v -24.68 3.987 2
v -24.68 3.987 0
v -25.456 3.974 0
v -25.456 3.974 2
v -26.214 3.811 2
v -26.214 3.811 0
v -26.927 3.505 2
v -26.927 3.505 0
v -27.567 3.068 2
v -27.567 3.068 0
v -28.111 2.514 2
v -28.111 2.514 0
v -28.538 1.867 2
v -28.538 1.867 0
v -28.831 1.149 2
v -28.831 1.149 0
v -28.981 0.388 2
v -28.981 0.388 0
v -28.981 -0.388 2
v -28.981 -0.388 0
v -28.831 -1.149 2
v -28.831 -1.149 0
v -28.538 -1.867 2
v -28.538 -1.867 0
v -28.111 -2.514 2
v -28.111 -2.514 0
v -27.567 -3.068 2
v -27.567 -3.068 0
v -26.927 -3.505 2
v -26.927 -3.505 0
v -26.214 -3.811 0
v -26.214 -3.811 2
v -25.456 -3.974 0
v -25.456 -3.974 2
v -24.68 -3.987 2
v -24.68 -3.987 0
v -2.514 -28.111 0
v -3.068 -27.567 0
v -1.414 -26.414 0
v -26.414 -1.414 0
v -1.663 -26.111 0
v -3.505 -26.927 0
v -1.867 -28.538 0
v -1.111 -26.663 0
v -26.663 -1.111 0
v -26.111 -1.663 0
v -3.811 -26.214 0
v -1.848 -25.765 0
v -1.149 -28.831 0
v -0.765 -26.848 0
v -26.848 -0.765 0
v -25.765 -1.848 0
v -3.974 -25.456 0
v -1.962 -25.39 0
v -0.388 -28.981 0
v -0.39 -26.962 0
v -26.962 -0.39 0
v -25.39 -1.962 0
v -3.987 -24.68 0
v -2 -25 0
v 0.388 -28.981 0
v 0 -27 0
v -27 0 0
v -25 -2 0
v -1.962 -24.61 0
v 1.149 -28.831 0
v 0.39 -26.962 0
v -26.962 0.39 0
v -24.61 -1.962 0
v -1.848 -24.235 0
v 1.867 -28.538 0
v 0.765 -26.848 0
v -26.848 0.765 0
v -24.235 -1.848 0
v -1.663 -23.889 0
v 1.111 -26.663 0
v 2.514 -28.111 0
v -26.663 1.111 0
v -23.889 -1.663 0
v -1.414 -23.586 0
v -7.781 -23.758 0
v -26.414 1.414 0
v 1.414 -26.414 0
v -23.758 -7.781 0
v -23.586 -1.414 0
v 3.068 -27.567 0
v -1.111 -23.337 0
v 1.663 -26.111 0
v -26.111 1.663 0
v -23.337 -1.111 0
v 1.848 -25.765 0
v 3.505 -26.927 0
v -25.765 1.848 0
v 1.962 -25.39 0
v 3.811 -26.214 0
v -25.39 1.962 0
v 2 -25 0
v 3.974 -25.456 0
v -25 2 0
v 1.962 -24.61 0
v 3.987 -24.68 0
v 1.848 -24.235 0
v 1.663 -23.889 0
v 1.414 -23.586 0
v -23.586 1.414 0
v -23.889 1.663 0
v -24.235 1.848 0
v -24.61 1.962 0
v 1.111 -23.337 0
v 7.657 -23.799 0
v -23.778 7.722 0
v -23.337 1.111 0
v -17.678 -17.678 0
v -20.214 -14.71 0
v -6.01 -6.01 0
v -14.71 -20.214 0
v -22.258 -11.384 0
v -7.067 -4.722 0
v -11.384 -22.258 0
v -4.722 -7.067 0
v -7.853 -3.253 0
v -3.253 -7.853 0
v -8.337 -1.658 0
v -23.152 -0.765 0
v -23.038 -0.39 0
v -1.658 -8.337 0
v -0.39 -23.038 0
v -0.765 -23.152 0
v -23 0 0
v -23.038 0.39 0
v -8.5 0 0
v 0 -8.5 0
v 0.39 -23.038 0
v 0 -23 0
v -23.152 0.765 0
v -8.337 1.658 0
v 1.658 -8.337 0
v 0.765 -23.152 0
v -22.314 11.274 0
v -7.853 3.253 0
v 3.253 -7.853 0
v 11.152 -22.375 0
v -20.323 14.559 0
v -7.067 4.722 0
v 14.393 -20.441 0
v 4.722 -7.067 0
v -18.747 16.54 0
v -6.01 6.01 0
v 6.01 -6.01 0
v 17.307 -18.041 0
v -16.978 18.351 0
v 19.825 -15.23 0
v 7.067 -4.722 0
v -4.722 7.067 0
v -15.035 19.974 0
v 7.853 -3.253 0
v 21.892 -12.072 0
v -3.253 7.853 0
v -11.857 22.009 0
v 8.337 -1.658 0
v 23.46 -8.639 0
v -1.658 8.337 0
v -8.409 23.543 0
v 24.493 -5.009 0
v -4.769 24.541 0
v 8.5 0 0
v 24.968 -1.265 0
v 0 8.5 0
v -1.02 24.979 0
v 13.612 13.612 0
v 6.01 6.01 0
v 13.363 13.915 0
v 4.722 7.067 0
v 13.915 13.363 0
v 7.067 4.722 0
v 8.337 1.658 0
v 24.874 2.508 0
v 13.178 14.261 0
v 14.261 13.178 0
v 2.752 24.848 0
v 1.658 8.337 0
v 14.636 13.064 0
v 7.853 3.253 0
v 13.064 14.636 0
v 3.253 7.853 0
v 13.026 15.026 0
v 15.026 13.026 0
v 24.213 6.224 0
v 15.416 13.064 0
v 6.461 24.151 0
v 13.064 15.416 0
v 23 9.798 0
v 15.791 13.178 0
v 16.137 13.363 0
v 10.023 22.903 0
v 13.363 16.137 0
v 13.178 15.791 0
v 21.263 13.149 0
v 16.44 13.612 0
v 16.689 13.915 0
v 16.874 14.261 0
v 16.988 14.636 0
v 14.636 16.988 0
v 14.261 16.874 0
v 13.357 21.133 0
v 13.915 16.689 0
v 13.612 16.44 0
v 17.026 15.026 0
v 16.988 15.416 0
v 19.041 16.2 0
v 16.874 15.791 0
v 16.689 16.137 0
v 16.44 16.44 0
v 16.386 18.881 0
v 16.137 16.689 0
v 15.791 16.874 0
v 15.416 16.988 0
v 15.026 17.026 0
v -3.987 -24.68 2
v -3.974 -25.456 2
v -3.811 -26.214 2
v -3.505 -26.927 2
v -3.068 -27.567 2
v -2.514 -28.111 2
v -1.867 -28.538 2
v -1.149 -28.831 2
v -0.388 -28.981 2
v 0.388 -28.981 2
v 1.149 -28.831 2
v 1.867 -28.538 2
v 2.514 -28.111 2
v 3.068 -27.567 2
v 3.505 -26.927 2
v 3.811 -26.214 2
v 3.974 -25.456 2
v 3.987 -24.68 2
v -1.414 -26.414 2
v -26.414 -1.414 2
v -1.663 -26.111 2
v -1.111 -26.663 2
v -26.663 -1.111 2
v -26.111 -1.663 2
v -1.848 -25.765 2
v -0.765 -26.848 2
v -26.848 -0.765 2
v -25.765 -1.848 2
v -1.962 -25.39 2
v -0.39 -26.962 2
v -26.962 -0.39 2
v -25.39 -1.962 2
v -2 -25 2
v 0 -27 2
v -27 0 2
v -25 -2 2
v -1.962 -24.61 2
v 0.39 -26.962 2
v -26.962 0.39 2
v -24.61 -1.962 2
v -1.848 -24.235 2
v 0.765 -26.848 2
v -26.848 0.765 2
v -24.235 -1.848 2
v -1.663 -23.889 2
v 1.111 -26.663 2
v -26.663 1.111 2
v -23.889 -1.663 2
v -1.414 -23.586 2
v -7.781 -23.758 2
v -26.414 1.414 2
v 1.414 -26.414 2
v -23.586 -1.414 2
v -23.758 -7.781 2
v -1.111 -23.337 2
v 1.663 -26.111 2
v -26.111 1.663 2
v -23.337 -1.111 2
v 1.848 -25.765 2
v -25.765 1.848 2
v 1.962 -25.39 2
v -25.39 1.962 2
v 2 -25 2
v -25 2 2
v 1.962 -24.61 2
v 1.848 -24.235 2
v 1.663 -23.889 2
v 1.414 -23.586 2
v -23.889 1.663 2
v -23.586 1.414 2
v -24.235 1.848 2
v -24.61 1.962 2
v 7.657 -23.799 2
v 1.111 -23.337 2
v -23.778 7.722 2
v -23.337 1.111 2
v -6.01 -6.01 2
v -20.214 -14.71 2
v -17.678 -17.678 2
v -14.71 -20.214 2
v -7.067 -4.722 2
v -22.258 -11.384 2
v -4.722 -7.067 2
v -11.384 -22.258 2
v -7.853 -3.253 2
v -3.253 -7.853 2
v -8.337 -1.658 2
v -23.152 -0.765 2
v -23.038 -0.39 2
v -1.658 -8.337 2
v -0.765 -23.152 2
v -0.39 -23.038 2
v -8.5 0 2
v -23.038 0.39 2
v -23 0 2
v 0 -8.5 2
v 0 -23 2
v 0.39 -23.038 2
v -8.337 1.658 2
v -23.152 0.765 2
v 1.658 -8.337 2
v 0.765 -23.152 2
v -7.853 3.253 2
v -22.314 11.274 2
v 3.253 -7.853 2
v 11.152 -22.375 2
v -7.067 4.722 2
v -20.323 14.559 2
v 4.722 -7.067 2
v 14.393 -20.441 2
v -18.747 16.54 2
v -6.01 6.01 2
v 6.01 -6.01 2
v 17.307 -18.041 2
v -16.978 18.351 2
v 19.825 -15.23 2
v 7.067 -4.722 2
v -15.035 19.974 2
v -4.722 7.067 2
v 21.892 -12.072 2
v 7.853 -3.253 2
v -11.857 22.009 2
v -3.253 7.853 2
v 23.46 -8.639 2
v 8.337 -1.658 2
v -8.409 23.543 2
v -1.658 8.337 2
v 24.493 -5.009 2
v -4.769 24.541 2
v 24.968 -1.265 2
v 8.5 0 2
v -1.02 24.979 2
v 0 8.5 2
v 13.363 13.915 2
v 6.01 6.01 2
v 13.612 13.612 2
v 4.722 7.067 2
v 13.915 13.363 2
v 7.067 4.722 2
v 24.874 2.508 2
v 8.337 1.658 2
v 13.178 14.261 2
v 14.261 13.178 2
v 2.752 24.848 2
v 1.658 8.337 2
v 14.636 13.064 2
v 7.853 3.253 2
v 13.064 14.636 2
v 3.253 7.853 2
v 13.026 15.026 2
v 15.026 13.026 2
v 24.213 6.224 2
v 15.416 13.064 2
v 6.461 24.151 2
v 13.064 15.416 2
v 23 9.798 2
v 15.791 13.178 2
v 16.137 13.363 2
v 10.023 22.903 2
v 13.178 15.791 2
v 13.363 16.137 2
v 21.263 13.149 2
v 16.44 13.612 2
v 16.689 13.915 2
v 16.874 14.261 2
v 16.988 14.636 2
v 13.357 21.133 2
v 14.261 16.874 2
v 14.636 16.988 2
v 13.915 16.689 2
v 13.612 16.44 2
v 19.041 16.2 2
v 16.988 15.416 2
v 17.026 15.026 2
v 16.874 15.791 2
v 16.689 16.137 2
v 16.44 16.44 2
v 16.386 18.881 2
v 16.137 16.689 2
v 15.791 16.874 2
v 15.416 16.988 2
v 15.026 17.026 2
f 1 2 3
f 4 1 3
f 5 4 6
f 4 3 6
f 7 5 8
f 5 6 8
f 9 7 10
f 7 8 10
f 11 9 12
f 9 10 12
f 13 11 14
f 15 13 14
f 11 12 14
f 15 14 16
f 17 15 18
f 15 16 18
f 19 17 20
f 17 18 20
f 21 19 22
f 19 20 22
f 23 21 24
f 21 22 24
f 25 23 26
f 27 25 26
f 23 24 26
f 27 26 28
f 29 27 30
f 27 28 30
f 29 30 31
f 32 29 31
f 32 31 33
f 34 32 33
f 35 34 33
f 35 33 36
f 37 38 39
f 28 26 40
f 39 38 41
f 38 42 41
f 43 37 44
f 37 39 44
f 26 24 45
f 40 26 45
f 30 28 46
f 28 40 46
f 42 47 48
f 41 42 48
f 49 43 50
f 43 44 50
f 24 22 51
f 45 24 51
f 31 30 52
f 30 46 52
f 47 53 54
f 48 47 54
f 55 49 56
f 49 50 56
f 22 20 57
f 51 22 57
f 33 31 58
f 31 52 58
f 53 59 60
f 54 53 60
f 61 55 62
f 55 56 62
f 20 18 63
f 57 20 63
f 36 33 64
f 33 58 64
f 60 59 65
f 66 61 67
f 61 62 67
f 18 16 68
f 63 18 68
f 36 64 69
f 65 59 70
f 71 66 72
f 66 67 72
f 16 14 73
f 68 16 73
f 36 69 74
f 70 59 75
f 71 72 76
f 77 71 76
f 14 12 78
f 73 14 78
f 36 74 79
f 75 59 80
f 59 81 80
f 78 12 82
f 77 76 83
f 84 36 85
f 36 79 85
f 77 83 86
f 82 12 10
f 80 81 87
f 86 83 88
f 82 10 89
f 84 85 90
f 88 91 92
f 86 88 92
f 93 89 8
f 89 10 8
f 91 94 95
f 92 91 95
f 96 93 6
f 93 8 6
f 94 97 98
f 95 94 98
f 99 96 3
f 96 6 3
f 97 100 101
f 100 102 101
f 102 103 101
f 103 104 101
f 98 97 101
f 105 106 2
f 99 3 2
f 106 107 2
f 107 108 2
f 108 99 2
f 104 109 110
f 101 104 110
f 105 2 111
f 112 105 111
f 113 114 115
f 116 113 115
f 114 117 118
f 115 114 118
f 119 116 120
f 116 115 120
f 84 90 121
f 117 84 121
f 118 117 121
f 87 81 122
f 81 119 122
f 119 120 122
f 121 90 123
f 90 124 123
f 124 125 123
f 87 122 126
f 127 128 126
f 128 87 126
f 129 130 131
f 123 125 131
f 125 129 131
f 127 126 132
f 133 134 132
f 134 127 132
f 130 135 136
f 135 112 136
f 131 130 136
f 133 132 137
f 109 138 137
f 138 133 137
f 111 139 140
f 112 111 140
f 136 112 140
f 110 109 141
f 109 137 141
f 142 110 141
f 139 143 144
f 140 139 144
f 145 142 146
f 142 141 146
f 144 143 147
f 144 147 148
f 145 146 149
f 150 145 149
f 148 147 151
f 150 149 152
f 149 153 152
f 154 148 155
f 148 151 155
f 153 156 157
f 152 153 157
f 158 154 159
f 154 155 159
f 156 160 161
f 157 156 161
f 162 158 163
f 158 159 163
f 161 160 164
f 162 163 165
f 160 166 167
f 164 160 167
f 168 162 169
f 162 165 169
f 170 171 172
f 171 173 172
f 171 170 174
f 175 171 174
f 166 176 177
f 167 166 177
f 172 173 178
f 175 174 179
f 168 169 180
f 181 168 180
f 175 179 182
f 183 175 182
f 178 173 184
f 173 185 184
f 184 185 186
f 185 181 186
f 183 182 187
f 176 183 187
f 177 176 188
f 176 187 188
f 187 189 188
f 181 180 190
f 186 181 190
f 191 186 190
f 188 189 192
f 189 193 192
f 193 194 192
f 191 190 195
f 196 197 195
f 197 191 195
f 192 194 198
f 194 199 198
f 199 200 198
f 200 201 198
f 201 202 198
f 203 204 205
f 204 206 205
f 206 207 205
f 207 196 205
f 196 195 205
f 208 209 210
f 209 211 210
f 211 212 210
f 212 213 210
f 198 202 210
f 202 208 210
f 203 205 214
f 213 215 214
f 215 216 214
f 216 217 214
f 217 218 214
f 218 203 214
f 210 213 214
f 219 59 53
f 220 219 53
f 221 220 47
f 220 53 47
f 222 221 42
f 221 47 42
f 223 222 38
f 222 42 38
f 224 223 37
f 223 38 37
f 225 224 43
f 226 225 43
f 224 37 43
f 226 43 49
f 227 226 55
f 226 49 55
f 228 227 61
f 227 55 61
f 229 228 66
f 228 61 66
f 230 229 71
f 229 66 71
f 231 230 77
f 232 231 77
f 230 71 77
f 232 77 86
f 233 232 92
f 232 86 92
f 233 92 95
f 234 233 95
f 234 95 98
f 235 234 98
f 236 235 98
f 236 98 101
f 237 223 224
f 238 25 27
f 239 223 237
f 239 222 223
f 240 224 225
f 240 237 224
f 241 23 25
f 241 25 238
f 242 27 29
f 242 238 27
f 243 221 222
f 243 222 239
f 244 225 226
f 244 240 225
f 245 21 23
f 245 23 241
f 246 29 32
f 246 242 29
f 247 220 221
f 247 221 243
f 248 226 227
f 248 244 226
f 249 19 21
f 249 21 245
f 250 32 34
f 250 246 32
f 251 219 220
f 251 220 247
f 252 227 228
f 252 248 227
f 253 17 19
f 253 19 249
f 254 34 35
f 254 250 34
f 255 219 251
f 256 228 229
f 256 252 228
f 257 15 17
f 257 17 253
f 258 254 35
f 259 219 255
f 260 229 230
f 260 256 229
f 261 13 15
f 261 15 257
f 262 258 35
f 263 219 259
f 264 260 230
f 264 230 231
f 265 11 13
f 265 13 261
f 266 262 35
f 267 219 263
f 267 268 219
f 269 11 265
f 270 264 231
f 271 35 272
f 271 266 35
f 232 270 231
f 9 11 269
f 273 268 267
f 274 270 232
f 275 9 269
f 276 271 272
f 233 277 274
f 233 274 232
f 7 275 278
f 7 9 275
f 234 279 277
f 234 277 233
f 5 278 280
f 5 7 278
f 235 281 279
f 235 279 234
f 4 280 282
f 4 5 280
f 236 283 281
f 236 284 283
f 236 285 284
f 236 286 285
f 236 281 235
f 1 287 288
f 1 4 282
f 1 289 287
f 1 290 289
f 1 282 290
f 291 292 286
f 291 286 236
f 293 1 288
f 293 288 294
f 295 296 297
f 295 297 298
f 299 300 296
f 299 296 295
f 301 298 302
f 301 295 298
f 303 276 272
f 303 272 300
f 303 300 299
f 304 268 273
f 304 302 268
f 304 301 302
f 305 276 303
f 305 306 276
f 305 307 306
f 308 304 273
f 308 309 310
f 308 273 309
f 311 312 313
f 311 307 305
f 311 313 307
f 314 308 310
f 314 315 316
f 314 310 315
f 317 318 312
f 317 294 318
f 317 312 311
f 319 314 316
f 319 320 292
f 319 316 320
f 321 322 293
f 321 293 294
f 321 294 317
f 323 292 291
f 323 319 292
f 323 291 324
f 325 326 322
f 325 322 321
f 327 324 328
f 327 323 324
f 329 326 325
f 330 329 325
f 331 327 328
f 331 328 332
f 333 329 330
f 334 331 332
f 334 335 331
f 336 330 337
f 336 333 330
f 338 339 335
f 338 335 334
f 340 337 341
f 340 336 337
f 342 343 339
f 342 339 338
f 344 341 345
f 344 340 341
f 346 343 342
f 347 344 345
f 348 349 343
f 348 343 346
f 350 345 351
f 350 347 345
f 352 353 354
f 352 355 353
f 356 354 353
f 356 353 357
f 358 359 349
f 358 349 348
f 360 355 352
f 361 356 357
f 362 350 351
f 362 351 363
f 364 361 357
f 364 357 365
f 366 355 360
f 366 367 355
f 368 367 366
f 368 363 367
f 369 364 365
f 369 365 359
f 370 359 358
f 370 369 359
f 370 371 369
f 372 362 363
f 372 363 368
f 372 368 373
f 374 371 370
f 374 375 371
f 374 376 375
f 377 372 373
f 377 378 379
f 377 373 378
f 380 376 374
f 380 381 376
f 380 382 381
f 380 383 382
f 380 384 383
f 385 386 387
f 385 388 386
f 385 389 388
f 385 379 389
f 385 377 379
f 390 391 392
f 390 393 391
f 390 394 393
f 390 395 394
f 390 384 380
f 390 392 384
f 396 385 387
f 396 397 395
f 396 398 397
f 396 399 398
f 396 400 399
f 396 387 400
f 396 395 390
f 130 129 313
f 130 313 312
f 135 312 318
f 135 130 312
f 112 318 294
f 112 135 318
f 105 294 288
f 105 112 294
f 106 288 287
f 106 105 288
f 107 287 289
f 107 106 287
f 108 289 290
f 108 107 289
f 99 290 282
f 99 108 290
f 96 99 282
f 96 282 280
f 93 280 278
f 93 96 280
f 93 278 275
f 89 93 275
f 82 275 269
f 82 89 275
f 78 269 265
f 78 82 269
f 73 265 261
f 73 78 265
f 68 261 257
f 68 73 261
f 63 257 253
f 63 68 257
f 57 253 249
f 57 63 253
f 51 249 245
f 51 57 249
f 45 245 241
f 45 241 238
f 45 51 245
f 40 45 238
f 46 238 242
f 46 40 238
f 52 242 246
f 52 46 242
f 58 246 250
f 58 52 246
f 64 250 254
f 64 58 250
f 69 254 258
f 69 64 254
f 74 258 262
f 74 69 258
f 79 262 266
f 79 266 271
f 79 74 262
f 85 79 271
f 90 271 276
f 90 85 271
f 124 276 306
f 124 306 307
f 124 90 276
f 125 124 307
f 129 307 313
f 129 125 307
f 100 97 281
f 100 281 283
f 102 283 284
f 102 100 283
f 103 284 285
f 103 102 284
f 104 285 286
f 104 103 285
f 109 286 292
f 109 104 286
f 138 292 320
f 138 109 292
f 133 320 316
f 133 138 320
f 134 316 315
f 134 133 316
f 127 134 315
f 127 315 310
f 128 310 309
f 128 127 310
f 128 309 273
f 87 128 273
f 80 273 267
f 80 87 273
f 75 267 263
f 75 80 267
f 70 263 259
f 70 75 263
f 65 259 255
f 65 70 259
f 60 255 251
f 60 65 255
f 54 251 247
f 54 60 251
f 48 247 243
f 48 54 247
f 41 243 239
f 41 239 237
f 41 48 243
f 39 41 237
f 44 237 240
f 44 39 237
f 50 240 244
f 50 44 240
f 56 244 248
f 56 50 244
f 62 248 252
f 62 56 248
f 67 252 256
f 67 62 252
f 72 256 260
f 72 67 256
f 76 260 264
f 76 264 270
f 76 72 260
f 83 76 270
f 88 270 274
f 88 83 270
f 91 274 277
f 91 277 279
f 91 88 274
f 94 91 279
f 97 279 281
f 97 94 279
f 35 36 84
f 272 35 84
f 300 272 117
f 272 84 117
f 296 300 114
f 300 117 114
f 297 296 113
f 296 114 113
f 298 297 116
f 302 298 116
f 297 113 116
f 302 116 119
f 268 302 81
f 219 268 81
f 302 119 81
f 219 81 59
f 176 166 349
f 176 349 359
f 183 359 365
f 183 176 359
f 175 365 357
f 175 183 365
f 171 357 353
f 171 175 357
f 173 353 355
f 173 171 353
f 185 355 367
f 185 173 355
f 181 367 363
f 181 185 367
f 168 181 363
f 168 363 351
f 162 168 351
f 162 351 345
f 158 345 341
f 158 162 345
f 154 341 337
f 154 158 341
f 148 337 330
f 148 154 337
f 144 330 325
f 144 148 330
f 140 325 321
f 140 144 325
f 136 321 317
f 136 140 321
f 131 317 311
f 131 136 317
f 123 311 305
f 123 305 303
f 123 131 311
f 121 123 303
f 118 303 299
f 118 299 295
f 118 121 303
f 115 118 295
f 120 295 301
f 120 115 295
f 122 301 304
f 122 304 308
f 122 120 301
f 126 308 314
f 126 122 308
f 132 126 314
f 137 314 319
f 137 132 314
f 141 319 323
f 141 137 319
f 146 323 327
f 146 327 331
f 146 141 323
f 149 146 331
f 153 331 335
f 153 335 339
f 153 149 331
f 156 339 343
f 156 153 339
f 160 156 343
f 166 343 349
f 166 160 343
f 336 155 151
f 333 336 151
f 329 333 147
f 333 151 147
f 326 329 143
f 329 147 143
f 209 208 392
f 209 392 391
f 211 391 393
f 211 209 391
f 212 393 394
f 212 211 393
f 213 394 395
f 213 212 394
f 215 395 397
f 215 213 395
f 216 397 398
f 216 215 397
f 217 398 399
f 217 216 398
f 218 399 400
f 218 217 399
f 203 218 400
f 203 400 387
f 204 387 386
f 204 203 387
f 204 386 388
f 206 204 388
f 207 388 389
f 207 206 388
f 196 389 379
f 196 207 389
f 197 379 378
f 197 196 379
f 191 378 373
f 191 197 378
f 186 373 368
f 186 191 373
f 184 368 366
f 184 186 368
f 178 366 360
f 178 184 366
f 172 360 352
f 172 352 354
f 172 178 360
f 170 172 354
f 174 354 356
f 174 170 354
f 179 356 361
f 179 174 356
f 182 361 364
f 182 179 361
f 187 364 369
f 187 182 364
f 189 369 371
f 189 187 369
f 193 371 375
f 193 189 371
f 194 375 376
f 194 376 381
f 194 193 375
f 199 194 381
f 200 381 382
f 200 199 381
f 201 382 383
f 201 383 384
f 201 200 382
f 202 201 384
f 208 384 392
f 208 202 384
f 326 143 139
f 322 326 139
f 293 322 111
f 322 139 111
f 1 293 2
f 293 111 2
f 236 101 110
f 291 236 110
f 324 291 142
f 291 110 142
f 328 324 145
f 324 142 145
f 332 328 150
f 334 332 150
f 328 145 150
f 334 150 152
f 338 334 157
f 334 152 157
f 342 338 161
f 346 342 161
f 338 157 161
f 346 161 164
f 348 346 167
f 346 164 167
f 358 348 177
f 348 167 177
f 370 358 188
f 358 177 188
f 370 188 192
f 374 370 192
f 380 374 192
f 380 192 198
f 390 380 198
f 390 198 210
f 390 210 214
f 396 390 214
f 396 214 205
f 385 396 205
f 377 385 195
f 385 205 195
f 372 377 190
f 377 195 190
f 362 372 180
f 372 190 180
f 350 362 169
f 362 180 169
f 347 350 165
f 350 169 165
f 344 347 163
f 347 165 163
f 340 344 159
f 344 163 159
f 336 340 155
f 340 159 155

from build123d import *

# Parameters (mm, degrees)
SKETCH1_R           = 8.5
SKETCH1_R_2         = 2
BOSS_EXTRUDE1_DEPTH = 2


with BuildPart() as part:
    # Sketch1 → Boss-Extrude1 (new body)
    with BuildSketch(Plane.XY):
        with BuildLine():
            ThreePointArc((-15.03512775, 19.973605922), (-17.88515711, 17.467717514), (-20.323051095, 14.559312971))
            ThreePointArc((-20.323051095, 14.559312971), (-23.11408994, 9.525694004), (-24.68, 3.987179454))
            ThreePointArc((-24.68, 3.987179454), (-29, 0), (-24.68, -3.987179454))
            ThreePointArc((-24.68, -3.987179454), (-17.67766953, -17.67766953), (-3.987179454, -24.68))
            ThreePointArc((-3.987179454, -24.68), (0, -29), (3.987179454, -24.68))
            ThreePointArc((3.987179454, -24.68), (23.000009149, 9.797937495), (-15.03512775, 19.973605922))
        make_face()
        Circle(SKETCH1_R, mode=Mode.SUBTRACT)
        with Locations((0, -25)):
            Circle(SKETCH1_R_2, mode=Mode.SUBTRACT)
        with Locations((15.0260191, 15.0260191)):
            Circle(SKETCH1_R_2, mode=Mode.SUBTRACT)
        with Locations((-25, 0)):
            Circle(SKETCH1_R_2, mode=Mode.SUBTRACT)
    extrude(amount=BOSS_EXTRUDE1_DEPTH)


solid = part.part
